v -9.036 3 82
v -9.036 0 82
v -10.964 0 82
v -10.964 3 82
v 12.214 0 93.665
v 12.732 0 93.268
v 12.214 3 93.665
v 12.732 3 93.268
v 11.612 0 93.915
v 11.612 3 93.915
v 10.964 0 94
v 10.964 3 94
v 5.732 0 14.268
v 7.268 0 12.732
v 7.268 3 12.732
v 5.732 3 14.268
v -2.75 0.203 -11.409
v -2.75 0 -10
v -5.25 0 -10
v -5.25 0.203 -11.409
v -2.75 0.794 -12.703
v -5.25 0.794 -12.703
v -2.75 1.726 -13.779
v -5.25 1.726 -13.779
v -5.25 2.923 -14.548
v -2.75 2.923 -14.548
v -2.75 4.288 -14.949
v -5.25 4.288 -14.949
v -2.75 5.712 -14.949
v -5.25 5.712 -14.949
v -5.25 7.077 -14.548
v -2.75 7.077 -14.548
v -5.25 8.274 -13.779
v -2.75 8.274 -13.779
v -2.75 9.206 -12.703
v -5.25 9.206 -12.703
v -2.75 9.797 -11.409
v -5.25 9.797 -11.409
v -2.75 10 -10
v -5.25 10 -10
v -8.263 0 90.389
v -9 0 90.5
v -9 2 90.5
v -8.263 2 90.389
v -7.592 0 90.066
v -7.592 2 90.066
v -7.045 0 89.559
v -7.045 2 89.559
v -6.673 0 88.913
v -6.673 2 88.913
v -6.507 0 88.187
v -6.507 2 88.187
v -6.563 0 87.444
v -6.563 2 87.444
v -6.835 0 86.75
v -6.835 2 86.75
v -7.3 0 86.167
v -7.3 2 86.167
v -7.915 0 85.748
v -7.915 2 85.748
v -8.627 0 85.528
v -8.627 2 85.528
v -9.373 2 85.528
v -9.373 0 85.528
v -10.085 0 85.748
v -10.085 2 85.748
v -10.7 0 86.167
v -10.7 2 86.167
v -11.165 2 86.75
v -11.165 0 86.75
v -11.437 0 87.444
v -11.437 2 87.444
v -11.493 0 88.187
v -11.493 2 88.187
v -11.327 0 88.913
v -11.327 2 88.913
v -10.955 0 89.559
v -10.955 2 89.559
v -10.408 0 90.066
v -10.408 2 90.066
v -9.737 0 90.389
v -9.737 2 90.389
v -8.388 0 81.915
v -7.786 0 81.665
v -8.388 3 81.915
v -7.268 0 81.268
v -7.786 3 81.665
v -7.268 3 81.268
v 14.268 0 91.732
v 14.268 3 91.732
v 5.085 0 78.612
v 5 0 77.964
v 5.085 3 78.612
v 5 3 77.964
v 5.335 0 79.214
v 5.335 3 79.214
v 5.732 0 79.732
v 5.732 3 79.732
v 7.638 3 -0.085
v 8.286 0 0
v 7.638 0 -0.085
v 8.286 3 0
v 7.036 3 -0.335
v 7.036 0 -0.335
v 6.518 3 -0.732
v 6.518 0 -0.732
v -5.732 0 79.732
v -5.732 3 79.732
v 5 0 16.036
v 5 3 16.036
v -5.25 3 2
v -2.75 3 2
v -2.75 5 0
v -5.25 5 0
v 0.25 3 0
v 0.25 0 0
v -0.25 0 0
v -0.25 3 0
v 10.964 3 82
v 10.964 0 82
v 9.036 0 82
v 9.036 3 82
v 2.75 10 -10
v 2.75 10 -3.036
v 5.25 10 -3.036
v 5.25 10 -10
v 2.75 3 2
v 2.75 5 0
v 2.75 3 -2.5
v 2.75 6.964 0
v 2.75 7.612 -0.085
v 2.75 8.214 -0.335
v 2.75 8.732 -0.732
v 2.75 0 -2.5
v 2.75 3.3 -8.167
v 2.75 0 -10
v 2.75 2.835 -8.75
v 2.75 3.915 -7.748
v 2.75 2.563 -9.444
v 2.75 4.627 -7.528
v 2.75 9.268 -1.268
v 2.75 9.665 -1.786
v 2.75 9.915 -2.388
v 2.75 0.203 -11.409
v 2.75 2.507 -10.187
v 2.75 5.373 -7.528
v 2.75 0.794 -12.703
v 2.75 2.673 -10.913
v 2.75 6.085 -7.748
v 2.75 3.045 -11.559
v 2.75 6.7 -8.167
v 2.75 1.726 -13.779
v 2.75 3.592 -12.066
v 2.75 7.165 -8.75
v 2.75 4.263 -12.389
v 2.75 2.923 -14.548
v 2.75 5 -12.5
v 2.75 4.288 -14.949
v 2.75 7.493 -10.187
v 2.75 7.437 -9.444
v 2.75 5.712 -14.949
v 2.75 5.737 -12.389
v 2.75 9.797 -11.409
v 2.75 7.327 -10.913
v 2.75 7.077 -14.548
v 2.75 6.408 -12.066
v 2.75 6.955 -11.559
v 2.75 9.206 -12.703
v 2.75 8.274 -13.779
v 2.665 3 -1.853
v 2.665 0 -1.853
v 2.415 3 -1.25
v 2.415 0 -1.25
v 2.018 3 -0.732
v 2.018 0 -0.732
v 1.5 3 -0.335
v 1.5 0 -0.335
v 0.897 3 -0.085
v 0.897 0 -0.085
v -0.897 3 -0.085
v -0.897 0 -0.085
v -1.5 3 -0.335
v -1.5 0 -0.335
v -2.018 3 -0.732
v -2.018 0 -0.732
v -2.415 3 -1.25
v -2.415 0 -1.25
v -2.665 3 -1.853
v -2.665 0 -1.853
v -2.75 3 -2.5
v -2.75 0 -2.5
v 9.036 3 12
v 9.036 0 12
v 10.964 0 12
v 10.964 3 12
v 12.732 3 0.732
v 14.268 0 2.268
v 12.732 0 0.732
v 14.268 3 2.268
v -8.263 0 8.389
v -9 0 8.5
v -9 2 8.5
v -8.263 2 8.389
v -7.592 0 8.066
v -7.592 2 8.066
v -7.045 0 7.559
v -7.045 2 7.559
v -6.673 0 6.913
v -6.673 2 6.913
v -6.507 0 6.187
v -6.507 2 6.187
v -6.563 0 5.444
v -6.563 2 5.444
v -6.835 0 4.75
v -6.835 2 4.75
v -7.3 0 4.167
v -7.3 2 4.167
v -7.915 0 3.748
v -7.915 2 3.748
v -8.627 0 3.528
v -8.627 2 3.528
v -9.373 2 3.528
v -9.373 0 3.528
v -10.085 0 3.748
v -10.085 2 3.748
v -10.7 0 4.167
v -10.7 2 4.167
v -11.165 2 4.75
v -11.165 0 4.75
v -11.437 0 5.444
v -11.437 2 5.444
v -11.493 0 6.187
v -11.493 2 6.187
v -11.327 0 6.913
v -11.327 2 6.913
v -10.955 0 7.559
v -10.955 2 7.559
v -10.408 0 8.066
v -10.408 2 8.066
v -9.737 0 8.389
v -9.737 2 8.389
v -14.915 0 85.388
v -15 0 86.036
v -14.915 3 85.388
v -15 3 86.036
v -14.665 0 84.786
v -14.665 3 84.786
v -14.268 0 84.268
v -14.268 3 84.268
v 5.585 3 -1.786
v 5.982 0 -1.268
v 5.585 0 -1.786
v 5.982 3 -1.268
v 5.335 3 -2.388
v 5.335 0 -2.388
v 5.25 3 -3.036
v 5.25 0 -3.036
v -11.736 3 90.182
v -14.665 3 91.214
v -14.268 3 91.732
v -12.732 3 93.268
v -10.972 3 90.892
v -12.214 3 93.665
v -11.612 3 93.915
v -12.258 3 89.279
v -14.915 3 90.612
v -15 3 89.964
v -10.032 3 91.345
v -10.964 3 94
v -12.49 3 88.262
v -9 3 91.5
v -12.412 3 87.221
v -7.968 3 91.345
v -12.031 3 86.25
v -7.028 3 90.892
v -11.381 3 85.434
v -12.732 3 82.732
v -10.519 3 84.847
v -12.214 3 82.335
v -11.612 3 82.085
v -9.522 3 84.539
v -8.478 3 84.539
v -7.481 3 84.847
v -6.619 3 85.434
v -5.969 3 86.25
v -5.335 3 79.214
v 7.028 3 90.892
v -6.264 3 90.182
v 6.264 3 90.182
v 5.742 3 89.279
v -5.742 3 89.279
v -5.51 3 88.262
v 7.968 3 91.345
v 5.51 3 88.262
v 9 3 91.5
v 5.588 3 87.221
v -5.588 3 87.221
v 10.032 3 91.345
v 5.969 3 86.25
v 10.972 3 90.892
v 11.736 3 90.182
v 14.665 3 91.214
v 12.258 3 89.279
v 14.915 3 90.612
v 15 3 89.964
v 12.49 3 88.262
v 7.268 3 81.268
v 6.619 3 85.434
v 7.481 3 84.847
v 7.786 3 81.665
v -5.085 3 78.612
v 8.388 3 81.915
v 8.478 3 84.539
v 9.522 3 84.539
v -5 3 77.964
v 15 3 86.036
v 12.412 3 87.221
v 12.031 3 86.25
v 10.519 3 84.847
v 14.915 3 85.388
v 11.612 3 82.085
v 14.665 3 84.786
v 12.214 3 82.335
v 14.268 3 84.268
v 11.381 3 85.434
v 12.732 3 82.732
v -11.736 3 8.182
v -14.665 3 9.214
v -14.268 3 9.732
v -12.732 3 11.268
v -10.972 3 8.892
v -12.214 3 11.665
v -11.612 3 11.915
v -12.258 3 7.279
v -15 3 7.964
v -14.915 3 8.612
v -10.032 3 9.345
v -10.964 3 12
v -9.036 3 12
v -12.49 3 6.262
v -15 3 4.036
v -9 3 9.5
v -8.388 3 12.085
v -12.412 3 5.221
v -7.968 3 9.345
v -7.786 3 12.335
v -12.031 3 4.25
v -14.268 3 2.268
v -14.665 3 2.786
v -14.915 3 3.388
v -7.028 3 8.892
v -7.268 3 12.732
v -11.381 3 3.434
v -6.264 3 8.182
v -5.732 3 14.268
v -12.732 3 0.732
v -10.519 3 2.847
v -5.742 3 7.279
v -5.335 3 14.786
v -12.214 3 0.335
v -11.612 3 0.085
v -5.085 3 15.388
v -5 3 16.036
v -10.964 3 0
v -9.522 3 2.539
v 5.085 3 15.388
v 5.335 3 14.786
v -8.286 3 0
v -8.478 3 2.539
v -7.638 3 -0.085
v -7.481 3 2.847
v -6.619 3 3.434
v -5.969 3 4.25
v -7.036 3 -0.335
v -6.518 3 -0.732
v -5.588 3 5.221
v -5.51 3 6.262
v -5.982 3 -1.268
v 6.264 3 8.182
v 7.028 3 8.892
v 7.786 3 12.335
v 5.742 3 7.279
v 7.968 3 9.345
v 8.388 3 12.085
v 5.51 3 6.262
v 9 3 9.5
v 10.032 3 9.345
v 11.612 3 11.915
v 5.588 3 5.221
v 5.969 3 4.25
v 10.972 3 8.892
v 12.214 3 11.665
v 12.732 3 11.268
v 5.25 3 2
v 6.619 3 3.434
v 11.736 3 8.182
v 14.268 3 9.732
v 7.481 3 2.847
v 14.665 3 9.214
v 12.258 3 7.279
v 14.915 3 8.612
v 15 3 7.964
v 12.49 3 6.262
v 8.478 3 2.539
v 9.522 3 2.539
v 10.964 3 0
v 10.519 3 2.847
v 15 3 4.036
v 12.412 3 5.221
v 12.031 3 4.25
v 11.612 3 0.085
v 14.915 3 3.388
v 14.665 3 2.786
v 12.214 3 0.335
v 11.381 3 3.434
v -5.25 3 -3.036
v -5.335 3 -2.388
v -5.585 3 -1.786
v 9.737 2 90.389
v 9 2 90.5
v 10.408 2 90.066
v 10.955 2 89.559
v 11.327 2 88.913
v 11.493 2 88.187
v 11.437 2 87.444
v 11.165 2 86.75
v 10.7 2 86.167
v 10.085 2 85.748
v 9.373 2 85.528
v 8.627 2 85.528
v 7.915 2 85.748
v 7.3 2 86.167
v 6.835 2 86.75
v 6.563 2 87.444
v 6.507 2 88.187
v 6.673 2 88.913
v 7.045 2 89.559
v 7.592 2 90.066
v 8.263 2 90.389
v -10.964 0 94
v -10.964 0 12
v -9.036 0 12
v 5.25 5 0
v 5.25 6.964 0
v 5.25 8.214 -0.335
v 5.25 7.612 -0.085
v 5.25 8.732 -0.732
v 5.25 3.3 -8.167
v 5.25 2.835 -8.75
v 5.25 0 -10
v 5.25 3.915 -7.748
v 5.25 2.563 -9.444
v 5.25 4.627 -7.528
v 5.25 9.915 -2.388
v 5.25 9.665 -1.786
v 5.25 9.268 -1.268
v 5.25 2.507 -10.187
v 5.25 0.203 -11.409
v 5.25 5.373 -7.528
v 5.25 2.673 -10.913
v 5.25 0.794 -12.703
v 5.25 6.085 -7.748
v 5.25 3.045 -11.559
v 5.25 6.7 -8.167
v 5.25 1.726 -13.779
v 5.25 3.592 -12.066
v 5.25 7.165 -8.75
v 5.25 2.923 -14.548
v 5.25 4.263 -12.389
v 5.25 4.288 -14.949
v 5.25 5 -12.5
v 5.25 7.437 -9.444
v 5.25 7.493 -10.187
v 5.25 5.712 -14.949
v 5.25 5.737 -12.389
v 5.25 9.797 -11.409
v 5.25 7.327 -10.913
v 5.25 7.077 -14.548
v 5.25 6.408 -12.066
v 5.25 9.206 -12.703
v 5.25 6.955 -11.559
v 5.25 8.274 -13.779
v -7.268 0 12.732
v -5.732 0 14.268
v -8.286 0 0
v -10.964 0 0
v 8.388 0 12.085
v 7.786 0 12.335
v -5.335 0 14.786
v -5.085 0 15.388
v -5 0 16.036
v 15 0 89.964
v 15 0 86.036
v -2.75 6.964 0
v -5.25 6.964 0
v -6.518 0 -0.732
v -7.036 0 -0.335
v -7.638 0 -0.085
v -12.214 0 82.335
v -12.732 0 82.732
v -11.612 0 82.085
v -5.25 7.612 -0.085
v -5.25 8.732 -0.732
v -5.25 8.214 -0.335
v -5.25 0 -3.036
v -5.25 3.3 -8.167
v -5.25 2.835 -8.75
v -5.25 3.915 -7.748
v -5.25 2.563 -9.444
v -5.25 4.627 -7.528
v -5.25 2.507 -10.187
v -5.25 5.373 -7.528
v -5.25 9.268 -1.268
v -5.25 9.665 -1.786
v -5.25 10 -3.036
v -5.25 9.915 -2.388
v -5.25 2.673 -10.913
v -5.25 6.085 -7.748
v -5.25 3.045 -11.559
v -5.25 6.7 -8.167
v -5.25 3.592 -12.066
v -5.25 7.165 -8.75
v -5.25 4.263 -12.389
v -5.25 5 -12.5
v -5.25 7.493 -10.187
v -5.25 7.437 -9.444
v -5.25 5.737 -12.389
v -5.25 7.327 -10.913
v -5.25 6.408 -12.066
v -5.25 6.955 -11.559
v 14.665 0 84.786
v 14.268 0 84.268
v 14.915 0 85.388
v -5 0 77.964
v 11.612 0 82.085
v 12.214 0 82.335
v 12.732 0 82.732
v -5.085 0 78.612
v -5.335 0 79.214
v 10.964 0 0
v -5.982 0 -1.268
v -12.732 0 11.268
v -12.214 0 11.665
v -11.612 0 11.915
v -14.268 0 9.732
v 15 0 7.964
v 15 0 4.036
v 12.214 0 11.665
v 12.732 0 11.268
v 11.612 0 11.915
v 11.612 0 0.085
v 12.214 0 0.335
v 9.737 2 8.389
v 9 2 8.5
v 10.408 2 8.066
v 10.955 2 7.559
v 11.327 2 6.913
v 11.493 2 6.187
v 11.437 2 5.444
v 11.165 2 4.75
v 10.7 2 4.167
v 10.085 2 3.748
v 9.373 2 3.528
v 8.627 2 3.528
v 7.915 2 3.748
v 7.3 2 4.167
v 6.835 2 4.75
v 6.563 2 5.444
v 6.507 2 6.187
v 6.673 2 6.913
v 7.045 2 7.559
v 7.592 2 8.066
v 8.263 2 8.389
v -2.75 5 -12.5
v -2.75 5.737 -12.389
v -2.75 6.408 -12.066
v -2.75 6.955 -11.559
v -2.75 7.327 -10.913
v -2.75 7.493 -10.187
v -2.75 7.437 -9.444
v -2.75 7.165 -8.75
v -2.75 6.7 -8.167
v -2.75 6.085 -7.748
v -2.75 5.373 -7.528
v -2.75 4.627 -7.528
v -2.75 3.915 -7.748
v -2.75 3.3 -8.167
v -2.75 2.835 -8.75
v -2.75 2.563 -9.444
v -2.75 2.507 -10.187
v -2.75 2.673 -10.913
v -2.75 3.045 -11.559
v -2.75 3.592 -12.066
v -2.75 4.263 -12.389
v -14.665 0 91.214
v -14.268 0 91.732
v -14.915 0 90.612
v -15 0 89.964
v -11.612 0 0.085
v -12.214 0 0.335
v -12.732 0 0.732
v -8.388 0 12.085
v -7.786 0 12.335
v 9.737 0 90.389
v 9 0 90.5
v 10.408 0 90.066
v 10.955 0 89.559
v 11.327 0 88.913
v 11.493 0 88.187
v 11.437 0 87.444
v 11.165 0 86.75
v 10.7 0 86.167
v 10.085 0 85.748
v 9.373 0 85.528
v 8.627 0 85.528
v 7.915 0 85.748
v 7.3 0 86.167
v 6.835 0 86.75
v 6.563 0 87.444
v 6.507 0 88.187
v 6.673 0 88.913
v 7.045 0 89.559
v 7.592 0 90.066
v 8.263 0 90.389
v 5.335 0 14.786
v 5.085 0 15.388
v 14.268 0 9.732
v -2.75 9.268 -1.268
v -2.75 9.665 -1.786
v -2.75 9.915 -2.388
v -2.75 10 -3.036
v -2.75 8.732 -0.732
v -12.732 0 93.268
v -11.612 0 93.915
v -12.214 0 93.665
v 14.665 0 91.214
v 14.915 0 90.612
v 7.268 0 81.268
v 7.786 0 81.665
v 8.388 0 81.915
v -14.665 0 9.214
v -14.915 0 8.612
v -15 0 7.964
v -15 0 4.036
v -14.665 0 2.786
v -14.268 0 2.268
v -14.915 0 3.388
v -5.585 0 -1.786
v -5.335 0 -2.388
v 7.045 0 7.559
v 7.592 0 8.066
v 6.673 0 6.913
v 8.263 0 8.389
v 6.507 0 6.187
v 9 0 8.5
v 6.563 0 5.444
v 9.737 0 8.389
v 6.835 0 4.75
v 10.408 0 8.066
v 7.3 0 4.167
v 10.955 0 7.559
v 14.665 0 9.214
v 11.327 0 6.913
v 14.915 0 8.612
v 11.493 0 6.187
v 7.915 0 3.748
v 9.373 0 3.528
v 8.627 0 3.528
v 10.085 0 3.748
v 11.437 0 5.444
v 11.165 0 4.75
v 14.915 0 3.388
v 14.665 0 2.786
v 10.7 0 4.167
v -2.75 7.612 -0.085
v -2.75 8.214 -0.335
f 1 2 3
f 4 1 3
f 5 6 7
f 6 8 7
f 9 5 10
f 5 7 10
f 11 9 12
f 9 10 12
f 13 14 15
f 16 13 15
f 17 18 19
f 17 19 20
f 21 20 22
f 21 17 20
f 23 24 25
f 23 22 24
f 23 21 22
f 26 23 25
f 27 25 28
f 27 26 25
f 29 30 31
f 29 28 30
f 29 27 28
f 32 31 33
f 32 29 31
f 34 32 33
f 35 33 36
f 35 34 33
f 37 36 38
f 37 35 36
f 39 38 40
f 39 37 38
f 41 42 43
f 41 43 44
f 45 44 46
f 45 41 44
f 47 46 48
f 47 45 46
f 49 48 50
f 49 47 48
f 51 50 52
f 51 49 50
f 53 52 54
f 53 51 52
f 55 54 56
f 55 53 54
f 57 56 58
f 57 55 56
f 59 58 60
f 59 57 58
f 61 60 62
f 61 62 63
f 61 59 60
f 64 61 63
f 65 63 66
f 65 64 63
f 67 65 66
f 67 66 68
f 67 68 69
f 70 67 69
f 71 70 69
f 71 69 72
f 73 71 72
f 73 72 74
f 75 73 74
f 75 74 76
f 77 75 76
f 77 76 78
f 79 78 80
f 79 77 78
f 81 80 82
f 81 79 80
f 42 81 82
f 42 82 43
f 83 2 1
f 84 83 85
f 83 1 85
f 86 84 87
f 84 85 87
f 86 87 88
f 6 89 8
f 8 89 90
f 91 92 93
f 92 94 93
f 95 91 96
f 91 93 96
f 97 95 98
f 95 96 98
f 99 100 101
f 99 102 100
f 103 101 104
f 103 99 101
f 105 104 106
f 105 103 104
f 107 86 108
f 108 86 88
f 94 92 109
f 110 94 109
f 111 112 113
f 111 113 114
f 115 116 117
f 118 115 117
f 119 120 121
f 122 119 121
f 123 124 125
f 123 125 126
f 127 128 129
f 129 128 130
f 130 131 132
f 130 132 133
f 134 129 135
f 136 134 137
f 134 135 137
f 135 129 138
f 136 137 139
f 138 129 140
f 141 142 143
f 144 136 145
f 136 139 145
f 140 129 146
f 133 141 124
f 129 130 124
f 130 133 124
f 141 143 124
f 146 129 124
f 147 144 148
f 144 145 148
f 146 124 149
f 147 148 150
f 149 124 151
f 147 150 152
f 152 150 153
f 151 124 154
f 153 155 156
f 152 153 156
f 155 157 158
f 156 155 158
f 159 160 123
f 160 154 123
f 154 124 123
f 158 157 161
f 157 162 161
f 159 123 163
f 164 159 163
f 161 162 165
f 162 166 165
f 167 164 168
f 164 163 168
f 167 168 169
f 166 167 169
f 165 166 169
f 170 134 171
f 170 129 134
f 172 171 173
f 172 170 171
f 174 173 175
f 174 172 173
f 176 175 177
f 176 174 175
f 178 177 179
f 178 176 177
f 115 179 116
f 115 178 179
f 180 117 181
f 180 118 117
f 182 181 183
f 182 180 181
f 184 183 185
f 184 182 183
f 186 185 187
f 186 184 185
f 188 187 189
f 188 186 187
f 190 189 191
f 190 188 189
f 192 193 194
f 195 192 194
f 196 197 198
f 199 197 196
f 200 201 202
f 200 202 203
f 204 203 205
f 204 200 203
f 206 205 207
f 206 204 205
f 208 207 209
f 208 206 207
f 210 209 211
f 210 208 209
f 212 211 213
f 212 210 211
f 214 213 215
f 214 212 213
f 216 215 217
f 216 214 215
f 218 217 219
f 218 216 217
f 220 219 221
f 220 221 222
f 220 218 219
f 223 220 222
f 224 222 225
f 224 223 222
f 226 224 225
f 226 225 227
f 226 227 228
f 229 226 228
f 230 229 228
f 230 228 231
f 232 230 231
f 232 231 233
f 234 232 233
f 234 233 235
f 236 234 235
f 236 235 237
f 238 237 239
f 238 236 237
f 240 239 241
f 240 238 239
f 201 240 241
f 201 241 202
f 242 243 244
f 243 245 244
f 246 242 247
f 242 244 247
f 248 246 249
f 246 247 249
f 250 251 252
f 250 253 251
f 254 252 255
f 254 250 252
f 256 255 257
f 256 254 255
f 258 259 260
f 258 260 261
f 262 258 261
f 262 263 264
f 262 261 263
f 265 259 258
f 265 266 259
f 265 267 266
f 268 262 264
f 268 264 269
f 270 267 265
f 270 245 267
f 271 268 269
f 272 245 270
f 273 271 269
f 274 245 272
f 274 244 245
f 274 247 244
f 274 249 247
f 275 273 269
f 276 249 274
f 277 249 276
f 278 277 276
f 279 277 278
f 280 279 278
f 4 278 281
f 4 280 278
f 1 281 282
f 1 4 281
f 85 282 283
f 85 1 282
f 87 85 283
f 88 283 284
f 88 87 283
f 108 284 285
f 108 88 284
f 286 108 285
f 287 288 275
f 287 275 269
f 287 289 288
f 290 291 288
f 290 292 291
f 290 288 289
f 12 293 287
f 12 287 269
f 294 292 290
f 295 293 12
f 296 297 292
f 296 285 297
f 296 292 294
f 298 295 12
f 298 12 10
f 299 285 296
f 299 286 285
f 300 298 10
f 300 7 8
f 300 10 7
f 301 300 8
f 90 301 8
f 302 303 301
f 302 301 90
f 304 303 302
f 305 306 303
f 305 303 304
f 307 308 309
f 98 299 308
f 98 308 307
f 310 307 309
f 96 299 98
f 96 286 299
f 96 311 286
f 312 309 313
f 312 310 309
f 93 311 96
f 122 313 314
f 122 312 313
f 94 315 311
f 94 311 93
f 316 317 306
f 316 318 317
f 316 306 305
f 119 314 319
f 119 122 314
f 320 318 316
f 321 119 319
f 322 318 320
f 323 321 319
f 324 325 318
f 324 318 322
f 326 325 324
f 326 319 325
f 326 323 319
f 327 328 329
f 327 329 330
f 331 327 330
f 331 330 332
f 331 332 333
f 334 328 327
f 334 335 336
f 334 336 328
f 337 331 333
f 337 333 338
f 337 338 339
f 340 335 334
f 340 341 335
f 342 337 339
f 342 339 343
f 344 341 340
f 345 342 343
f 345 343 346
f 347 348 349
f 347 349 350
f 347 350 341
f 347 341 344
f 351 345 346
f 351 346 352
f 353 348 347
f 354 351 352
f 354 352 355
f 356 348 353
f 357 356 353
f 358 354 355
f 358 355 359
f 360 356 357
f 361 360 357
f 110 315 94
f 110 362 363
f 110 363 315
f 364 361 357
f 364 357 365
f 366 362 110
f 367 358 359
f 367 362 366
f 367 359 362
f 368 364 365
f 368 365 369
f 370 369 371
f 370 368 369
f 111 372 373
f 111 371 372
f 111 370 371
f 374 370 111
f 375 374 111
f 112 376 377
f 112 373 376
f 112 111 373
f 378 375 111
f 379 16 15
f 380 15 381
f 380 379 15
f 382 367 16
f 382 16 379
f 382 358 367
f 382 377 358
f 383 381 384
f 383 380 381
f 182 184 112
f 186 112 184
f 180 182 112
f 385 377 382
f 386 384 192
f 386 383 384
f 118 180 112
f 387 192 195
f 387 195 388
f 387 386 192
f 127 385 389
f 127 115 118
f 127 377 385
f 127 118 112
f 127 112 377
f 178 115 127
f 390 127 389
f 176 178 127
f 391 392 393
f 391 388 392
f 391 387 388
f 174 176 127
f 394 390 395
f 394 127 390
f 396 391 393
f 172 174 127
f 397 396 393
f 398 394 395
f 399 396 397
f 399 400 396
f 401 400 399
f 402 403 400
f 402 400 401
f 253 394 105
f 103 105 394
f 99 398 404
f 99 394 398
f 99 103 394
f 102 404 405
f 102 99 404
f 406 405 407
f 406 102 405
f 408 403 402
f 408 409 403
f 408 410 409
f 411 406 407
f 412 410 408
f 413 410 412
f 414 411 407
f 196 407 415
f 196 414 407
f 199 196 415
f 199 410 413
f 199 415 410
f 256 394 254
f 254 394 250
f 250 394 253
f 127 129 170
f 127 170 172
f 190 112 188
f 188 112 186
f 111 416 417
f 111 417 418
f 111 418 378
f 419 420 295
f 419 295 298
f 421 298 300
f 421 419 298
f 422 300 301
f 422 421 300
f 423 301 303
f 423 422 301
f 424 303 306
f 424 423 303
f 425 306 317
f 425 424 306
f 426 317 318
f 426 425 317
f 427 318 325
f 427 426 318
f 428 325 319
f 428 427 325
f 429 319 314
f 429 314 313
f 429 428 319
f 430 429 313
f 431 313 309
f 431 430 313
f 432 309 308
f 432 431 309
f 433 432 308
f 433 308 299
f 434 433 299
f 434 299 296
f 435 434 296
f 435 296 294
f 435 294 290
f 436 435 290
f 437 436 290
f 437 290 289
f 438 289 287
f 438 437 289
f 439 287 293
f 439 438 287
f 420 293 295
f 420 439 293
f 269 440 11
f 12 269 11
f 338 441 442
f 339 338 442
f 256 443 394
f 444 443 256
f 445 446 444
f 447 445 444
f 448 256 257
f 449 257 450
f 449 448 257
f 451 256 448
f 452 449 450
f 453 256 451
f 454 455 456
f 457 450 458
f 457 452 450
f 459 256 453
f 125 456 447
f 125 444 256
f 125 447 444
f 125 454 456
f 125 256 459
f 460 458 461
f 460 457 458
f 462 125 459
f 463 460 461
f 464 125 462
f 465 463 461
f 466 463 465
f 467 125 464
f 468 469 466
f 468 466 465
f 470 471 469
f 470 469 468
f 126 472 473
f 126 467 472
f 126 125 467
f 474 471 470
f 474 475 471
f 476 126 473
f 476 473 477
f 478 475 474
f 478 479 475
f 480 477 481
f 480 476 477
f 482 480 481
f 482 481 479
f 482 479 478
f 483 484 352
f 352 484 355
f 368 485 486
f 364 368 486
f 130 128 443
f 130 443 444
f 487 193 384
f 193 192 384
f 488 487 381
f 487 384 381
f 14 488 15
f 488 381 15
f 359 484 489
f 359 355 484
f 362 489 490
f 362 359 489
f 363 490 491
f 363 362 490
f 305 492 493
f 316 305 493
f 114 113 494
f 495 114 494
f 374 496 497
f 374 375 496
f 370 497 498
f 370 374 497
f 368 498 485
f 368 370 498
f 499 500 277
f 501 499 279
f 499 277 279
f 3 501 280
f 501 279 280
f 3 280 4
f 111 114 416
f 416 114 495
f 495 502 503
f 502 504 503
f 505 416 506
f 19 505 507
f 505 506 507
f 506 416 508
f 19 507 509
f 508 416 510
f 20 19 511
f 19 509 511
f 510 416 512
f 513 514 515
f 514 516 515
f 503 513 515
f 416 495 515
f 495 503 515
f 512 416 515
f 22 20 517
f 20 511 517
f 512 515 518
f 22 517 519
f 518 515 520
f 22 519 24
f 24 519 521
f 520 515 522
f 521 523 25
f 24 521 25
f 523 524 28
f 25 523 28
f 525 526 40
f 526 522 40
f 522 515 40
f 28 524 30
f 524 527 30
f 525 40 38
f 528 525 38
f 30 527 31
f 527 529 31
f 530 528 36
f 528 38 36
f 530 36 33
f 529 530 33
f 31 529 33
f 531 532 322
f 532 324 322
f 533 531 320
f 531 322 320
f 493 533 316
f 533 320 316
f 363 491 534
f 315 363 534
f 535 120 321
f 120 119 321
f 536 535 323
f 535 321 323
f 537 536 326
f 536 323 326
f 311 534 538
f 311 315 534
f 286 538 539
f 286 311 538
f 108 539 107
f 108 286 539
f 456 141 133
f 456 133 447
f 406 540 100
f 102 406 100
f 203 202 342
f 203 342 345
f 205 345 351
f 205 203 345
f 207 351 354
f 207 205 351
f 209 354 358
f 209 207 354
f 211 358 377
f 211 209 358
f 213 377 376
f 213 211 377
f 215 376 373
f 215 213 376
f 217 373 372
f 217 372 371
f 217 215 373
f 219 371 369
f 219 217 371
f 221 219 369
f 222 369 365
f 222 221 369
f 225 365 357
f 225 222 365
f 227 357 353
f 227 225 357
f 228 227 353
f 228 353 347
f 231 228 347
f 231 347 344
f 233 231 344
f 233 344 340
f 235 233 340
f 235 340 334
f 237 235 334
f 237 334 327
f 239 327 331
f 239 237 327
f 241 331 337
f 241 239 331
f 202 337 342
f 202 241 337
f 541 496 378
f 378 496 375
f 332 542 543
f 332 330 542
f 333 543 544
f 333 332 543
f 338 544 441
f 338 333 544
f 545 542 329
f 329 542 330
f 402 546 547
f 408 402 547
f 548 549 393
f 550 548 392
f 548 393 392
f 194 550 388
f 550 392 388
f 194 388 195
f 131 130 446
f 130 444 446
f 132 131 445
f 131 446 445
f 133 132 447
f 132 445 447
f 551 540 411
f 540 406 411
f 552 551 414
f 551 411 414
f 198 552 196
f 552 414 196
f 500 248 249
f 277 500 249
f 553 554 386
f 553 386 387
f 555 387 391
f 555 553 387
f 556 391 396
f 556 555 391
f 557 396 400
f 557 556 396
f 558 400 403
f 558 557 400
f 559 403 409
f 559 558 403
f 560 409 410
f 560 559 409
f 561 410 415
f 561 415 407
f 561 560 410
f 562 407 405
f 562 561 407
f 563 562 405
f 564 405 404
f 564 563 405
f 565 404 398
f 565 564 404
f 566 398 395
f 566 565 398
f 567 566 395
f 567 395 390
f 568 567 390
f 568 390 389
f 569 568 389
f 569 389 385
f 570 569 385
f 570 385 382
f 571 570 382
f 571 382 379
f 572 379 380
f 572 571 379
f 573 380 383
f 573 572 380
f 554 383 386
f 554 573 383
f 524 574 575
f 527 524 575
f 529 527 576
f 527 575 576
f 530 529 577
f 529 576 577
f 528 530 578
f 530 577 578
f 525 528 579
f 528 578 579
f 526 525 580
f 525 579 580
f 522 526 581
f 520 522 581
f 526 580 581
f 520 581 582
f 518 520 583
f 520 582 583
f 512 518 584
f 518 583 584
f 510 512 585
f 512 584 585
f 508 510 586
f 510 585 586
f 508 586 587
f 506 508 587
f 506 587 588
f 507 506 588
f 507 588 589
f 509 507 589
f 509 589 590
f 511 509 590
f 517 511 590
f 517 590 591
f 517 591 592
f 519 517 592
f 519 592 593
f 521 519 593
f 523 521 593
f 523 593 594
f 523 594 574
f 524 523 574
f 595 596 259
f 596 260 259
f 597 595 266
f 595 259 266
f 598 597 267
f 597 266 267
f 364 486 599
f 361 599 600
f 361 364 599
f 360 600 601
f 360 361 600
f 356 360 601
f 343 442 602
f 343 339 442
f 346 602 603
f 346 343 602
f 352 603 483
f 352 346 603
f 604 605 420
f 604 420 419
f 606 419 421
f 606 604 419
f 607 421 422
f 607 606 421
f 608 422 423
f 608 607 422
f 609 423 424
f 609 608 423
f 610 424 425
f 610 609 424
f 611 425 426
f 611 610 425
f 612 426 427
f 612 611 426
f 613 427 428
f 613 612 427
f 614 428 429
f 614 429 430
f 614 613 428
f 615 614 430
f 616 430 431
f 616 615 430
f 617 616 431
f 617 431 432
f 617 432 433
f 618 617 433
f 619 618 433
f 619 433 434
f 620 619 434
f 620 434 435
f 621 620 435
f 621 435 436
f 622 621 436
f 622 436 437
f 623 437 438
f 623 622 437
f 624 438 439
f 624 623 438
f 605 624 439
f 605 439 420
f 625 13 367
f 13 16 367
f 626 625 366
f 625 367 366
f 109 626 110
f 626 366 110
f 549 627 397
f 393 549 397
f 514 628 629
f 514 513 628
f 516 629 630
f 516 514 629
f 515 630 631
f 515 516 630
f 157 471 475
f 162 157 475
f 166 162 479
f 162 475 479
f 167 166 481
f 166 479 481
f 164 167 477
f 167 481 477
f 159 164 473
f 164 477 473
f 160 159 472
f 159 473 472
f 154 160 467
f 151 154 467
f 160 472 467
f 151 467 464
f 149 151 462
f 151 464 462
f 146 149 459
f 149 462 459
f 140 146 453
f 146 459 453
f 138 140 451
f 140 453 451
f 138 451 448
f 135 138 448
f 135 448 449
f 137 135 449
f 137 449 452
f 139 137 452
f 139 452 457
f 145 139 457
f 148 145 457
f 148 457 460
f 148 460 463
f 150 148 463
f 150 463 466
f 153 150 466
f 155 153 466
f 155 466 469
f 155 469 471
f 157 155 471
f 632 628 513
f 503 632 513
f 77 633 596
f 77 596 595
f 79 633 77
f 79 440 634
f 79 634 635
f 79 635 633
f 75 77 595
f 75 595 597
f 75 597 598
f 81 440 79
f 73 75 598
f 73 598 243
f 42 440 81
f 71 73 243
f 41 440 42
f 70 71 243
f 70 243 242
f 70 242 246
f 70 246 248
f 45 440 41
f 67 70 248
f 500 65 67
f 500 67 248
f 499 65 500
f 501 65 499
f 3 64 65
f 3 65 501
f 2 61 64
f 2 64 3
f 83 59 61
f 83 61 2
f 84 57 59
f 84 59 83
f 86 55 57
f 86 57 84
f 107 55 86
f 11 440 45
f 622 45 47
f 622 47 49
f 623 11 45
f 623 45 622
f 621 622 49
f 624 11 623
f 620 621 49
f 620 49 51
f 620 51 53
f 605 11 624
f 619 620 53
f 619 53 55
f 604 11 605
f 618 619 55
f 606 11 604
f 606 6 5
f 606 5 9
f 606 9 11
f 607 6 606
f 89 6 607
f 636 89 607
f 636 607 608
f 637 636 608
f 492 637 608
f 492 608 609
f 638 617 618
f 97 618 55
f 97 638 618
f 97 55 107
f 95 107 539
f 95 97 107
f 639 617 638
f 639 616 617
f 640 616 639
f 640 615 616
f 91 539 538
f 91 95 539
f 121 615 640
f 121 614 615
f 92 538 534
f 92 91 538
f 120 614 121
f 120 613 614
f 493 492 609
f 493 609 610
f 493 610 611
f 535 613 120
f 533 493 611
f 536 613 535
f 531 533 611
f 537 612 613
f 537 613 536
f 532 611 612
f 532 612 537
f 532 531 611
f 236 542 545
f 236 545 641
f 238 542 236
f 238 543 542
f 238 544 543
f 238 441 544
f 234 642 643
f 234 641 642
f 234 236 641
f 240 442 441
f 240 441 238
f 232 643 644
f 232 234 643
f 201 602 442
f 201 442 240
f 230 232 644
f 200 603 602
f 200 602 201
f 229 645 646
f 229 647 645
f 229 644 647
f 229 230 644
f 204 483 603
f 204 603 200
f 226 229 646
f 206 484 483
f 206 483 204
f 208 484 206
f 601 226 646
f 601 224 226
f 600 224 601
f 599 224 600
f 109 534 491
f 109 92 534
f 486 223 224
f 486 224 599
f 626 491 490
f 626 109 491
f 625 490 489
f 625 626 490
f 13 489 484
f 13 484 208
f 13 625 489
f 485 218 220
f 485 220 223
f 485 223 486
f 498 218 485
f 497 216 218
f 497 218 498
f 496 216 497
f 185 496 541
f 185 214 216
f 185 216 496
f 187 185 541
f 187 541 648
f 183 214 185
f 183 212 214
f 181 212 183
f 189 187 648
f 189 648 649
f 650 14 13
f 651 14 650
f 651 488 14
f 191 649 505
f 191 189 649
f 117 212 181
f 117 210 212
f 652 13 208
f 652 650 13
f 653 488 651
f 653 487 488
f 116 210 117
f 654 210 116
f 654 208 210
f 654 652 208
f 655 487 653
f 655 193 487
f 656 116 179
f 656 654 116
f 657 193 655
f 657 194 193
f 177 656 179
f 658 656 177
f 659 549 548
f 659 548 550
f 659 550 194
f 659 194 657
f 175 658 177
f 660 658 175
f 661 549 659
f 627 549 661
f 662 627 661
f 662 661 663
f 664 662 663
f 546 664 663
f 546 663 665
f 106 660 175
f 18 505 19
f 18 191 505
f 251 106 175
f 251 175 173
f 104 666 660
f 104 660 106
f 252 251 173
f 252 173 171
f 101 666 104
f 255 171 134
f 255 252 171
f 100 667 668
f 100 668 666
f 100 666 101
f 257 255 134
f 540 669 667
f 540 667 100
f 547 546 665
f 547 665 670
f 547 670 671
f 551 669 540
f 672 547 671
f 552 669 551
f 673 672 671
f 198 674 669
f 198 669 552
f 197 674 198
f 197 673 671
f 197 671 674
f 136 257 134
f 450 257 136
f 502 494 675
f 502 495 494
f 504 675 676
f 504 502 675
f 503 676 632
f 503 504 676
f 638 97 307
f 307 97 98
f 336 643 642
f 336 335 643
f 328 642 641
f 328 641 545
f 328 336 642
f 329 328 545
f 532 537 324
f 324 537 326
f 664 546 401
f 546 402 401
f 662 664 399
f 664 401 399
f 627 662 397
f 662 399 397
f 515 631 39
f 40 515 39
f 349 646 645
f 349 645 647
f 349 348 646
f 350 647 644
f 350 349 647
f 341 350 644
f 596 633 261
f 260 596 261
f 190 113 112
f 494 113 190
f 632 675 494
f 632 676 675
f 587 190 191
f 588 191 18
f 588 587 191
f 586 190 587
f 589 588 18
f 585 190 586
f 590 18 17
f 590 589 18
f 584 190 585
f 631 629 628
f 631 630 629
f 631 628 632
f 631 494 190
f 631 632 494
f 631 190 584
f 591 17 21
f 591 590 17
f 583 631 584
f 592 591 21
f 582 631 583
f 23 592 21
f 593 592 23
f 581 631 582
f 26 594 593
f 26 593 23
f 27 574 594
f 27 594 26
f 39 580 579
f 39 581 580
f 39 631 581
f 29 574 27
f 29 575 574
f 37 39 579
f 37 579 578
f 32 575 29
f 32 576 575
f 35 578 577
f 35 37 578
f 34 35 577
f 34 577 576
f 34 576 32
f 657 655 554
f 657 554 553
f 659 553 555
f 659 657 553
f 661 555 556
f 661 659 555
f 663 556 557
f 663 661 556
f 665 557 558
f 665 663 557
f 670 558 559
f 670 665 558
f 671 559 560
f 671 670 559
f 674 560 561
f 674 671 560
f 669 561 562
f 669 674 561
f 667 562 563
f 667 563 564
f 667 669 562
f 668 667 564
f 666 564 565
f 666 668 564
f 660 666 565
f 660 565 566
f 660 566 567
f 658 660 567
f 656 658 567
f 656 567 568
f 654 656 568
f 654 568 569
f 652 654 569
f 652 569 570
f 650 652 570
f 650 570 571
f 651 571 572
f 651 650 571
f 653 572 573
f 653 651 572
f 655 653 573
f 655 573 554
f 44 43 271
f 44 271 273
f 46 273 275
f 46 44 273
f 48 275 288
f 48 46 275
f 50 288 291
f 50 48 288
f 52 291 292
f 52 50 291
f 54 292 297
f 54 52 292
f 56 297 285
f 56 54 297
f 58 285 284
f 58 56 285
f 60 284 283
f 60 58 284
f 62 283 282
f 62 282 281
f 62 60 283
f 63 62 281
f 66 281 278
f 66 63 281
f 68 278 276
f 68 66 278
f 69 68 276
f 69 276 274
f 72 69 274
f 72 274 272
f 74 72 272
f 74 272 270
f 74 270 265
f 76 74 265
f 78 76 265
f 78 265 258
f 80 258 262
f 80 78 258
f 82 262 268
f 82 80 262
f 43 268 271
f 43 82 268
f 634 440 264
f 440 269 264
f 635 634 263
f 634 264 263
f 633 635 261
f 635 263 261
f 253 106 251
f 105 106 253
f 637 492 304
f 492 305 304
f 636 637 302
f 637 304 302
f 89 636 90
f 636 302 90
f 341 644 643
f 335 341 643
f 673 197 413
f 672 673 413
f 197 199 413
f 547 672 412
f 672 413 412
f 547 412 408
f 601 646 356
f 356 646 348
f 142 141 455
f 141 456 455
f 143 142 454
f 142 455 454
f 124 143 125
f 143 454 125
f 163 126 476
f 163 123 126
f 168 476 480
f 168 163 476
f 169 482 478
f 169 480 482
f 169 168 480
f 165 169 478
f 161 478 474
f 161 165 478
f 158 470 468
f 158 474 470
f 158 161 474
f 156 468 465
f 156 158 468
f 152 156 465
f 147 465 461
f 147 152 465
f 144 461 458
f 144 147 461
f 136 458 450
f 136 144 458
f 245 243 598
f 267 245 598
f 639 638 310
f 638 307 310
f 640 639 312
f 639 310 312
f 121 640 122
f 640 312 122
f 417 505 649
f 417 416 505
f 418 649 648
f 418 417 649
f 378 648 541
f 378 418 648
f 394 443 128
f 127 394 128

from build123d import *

# Parameters (mm, degrees)
SKETCH2_R                   = 2.5
BOSS_EXTRUDE1_DEPTH         = 3
BOSS_EXTRUDE2_START         = 2.75
SKETCH3_W                   = 15
SKETCH3_H                   = 10
BOSS_EXTRUDE2_DEPTH         = 2.5
FILLET2_RADIUS              = 5
FILLET2_LENGTH              = 2.5
FILLET2_OF_MIRROR1_2_RADIUS = 5
FILLET2_OF_MIRROR1_2_LENGTH = 2.5
CHAMFER1_SIZE               = 2
CHAMFER2_SIZE               = 2
SKETCH5_R                   = 2.5
CUT_EXTRUDE2_DEPTH          = 97.675035557
CHAMFER3_SIZE               = 3
FILLET3_R                   = 2.5
CHAMFER4_SIZE               = 1


with BuildPart() as part:
    # Sketch2 → Boss-Extrude1 (new body)
    with BuildSketch(Plane(origin=(0, 0, 0), x_dir=(1, 0, 0), z_dir=(0, 1, 0))):
        Polygon((15, 0), (-15, 0), (-15, -12), (-5, -12), (-5, -82), (-15, -82), (-15, -94), (15, -94), (15, -82), (5, -82), (5, -12), (15, -12), align=None)
        with Locations(Location((-9, -6, 0), (0, 0, 270))):
            Circle(SKETCH2_R, mode=Mode.SUBTRACT)
        with Locations(Location((-9, -88, 0), (0, 0, 270))):
            Circle(SKETCH2_R, mode=Mode.SUBTRACT)
        with Locations(Location((9, -88, 0), (0, 0, 270))):
            Circle(SKETCH2_R, mode=Mode.SUBTRACT)
        with Locations(Location((9, -6, 0), (0, 0, 270))):
            Circle(SKETCH2_R, mode=Mode.SUBTRACT)
    extrude(amount=BOSS_EXTRUDE1_DEPTH)

    # Sketch3 → Boss-Extrude2 (add)
    with BuildSketch(Plane(origin=(0, 0, 0), x_dir=(0, 0, -1), z_dir=(1, 0, 0)).offset(BOSS_EXTRUDE2_START)):
        with Locations((7.5, 5)):
            Rectangle(SKETCH3_W, SKETCH3_H)
    boss_extrude2 = extrude(amount=BOSS_EXTRUDE2_DEPTH)

    # Fillet2: full round fillet: the end face becomes a half cylinder, R = half its width
    fillet2_face = Plane((4, 5, -15), x_dir=(-1, 0, 0), z_dir=(0, 0, -1))  # on the end face: x along it, z out of the body
    fillet2_slab = fillet2_face.offset(-FILLET2_RADIUS / 2) * Box(FILLET2_LENGTH, 2 * FILLET2_RADIUS, FILLET2_RADIUS, mode=Mode.PRIVATE)  # the body's end, R deep
    fillet2_round = Plane((4, 5, -10), x_dir=(0, 0, -1), z_dir=(-1, 0, 0)) * Cylinder(FILLET2_RADIUS, FILLET2_LENGTH, mode=Mode.PRIVATE)  # its axis R under the face
    add(fillet2_slab - fillet2_round, mode=Mode.SUBTRACT)

    # Mirror1: Boss-Extrude2 across plane
    add(boss_extrude2.mirror(Plane(origin=(0, 0, 0), x_dir=(0, 0, 1), z_dir=(1, 0, 0))))

    # Fillet2 of Mirror1 2: full round fillet: the end face becomes a half cylinder, R = half its width
    fillet2_of_mirror1_2_face = Plane((-4, 5, -15), x_dir=(1, 0, 0), z_dir=(0, 0, -1))  # on the end face: x along it, z out of the body
    fillet2_of_mirror1_2_slab = fillet2_of_mirror1_2_face.offset(-FILLET2_OF_MIRROR1_2_RADIUS / 2) * Box(FILLET2_OF_MIRROR1_2_LENGTH, 2 * FILLET2_OF_MIRROR1_2_RADIUS, FILLET2_OF_MIRROR1_2_RADIUS, mode=Mode.PRIVATE)  # the body's end, R deep
    fillet2_of_mirror1_2_round = Plane((-4, 5, -10), x_dir=(0, 0, -1), z_dir=(1, 0, 0)) * Cylinder(FILLET2_OF_MIRROR1_2_RADIUS, FILLET2_OF_MIRROR1_2_LENGTH, mode=Mode.PRIVATE)  # its axis R under the face
    add(fillet2_of_mirror1_2_slab - fillet2_of_mirror1_2_round, mode=Mode.SUBTRACT)

    # Chamfer1
    chamfer1_edges = [part.edges().sort_by_distance(p)[0] for p in [
        (4, 3, 0),
        (-4, 3, 0),
    ]]
    chamfer(chamfer1_edges, length=CHAMFER1_SIZE)

    # Chamfer2
    chamfer2_edges = [part.edges().sort_by_distance(p)[0] for p in [
        (-5.25, 1.5, 0),
        (5.25, 1.5, 0),
        (4, 10, 0),
        (-4, 10, 0),
    ]]
    chamfer(chamfer2_edges, length=CHAMFER2_SIZE)

    # Sketch5 → Cut-Extrude2 (cut, through all)
    with BuildSketch(Plane(origin=(5.25, 0, 0), x_dir=(0, 0, -1), z_dir=(1, 0, 0))):
        with Locations((10, 5)):
            Circle(SKETCH5_R)
    extrude(amount=-CUT_EXTRUDE2_DEPTH, mode=Mode.SUBTRACT)

    # Chamfer3
    chamfer3_edges = [part.edges().sort_by_distance(p)[0] for p in [
        (15, 1.5, 12),
        (5, 1.5, 12),
        (5, 1.5, 82),
        (15, 1.5, 82),
        (15, 1.5, 94),
        (-15, 1.5, 94),
        (-15, 1.5, 82),
        (-5, 1.5, 82),
        (-5, 1.5, 12),
        (-15, 1.5, 12),
        (-15, 1.5, 0),
        (15, 1.5, 0),
    ]]
    chamfer(chamfer3_edges, length=CHAMFER3_SIZE)

    # Fillet3
    fillet3_edges = [part.edges().sort_by_distance(p)[0] for p in [
        (-15, 1.5, 85),
        (-12, 1.5, 82),
        (-8, 1.5, 82),
        (-5, 1.5, 79),
        (-5, 1.5, 15),
        (-8, 1.5, 12),
        (-12, 1.5, 12),
        (-15, 1.5, 9),
        (-12, 1.5, 0),
        (-7.25, 1.5, 0),
        (-5.25, 1.5, -2),
        (-2.75, 1.5, 0),
        (2.75, 1.5, 0),
        (5.25, 1.5, -2),
        (7.25, 1.5, 0),
        (12, 1.5, 0),
        (15, 1.5, 3),
        (15, 1.5, 9),
        (12, 1.5, 12),
        (8, 1.5, 12),
        (5, 1.5, 15),
        (5, 1.5, 79),
        (8, 1.5, 82),
        (12, 1.5, 82),
        (15, 1.5, 85),
        (15, 1.5, 91),
        (12, 1.5, 94),
        (-12, 1.5, 94),
        (-15, 1.5, 91),
        (-15, 1.5, 3),
        (4, 8, 0),
        (4, 10, -2),
        (-4, 10, -2),
        (-4, 8, 0),
    ]]
    fillet(fillet3_edges, radius=FILLET3_R)

    # Chamfer4
    chamfer4_edges = [part.edges().sort_by_distance(p)[0] for p in [
        (9, 3, 85.5),
        (-9, 3, 85.5),
        (-9, 3, 3.5),
        (9, 3, 3.5),
    ]]
    chamfer(chamfer4_edges, length=CHAMFER4_SIZE)


solid = part.part
